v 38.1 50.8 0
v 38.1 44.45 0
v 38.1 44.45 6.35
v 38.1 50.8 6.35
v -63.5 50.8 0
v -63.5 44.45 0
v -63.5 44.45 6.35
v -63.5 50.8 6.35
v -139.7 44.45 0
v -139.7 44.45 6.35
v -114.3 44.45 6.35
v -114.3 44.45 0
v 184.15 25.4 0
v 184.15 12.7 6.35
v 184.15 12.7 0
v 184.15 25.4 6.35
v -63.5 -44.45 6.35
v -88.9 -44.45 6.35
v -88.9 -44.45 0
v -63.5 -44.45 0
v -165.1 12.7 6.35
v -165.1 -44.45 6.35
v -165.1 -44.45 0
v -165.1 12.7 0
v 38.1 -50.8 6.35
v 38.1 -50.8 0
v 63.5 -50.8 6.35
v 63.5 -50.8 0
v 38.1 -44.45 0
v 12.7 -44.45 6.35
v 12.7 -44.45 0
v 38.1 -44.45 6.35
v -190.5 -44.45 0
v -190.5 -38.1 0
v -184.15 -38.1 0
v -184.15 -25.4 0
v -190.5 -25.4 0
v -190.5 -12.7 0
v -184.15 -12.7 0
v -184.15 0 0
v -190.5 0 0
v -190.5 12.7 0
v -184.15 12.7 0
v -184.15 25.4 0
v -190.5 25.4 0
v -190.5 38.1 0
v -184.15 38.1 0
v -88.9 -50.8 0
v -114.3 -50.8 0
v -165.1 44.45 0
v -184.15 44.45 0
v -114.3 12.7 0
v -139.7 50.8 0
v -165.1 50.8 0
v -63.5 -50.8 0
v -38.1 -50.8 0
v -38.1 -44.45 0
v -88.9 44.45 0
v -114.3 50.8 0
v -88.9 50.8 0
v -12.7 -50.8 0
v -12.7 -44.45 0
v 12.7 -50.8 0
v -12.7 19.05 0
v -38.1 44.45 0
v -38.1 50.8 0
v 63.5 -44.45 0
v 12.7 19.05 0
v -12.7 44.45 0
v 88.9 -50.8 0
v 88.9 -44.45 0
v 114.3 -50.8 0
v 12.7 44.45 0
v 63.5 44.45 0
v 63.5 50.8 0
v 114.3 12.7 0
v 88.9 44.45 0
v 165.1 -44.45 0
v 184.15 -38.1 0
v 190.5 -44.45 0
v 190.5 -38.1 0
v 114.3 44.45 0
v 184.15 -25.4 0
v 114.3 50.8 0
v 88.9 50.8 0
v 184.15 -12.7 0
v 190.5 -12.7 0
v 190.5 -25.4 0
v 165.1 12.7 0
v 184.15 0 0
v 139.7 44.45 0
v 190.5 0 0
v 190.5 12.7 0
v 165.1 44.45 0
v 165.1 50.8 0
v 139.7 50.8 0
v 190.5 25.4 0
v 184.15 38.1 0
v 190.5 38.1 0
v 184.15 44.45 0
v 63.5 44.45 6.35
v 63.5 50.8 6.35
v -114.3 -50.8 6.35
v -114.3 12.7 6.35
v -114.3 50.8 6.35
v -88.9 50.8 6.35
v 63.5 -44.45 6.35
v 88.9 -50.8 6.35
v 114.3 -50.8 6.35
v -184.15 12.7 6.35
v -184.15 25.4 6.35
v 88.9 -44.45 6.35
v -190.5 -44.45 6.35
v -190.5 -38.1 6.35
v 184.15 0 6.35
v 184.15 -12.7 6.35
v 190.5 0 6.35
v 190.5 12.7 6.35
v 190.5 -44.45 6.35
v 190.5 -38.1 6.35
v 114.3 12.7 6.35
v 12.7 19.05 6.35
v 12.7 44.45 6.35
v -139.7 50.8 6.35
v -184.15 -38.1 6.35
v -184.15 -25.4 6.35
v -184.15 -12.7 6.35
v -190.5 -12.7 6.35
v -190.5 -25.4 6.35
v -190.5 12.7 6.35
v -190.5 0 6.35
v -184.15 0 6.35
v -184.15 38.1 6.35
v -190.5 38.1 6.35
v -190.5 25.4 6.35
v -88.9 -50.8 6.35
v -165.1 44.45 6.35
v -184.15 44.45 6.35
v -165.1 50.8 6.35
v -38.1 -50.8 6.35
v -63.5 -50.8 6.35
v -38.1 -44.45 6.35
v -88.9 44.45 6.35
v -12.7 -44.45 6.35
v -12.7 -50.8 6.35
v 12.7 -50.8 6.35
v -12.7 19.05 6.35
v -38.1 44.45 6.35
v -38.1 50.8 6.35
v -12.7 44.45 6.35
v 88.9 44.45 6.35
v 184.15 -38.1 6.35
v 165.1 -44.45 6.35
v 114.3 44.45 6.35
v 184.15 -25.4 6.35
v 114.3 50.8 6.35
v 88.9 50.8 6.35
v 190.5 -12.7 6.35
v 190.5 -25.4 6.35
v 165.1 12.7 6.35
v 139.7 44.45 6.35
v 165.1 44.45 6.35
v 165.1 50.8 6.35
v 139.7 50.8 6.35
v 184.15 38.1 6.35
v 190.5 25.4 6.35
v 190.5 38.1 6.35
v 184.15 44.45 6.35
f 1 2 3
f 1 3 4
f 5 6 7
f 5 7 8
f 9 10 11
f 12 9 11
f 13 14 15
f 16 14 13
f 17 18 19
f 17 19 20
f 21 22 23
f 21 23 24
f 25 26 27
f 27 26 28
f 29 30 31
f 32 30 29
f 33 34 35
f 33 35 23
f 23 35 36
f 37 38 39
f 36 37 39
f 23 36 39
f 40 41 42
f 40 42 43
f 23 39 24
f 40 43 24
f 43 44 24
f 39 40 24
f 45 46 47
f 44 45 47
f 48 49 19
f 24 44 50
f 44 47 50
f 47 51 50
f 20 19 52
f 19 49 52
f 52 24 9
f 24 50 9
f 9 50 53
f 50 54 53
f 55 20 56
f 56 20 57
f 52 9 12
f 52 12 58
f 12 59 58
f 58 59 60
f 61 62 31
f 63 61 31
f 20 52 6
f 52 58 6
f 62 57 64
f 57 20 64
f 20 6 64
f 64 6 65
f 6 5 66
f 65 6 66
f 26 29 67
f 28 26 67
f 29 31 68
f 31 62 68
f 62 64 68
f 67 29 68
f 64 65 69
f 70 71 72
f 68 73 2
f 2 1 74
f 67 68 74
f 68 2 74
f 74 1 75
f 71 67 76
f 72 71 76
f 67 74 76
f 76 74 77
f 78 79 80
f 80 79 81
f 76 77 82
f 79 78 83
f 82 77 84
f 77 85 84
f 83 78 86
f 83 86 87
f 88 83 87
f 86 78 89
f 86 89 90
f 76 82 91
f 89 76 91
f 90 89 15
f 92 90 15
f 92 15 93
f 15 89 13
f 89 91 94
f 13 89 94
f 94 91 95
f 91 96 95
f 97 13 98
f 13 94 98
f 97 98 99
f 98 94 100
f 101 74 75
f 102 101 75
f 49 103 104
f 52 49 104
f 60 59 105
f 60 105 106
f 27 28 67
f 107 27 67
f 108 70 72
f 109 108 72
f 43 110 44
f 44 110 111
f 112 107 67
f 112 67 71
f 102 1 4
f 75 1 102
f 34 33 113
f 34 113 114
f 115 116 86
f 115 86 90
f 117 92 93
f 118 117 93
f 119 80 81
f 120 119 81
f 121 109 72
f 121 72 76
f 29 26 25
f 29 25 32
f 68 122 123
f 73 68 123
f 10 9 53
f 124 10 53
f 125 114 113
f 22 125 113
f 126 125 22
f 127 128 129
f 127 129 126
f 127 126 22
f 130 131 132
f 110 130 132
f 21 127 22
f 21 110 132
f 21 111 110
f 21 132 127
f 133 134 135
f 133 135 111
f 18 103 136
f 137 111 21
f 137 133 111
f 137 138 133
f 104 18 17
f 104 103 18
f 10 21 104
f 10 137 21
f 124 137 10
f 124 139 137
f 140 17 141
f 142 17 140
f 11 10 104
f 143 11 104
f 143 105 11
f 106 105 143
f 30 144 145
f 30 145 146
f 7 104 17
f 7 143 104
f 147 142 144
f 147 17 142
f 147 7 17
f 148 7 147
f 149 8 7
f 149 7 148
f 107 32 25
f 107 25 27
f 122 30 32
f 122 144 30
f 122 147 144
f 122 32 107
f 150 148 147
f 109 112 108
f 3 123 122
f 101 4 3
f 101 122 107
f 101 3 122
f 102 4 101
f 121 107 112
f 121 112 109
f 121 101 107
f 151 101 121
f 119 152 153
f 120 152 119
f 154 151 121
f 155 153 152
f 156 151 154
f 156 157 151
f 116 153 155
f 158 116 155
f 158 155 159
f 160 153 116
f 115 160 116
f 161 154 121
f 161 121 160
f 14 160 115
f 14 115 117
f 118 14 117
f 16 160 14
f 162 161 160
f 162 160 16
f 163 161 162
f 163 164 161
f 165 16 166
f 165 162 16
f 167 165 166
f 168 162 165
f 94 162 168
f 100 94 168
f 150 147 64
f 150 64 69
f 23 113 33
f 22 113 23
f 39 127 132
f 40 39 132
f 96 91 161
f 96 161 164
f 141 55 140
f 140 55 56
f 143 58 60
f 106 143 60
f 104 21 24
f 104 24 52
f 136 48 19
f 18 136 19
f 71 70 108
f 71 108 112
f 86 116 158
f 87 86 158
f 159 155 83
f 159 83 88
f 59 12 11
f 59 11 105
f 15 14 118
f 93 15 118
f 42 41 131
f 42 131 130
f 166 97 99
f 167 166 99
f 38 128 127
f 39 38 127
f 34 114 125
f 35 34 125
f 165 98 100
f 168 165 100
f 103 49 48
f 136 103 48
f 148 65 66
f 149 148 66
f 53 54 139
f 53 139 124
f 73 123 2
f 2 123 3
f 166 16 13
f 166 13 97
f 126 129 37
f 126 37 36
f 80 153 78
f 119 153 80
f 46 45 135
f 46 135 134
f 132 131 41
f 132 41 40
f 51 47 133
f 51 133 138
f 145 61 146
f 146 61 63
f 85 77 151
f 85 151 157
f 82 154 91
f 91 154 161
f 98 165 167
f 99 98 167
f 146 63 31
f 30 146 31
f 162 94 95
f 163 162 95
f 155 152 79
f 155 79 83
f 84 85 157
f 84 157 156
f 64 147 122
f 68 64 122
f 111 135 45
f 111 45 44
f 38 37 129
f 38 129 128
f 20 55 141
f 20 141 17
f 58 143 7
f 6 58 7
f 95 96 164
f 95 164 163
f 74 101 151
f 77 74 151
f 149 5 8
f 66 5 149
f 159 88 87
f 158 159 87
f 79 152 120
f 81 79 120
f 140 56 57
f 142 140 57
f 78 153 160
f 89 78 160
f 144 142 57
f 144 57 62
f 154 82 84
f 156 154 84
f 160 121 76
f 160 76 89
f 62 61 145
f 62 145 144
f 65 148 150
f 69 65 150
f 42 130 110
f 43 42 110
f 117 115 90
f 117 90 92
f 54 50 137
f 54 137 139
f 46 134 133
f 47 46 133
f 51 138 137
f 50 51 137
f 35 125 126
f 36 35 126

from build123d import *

# Parameters (mm, degrees)
SKETCH1_W           = 381
SKETCH1_H           = 101.6
BOSS_EXTRUDE1_DEPTH = 6.35
SKETCH2_W           = 19.05
SKETCH2_H           = 6.35
SKETCH2_W_2         = 6.35
SKETCH2_H_2         = 12.7
SKETCH2_W_3         = 25.4
CUT_EXTRUDE1_DEPTH  = 6.35
SKETCH3_W           = 50.8
SKETCH3_H           = 63.5
CUT_EXTRUDE2_DEPTH  = 6.35
SKETCH4_W           = 25.4
SKETCH4_H           = 31.75
CUT_EXTRUDE3_DEPTH  = 6.35


with BuildPart() as part:
    # Sketch1 → Boss-Extrude1 (new body)
    with BuildSketch(Plane.XY):
        Rectangle(SKETCH1_W, SKETCH1_H)
    extrude(amount=BOSS_EXTRUDE1_DEPTH)

    # Sketch2 → Cut-Extrude1 (cut)
    with BuildSketch(Plane.XY.offset(6.35)):
        with Locations((-174.625, 47.625)):
            Rectangle(SKETCH2_W, SKETCH2_H)
        with Locations((-187.325, 47.625)):
            Rectangle(SKETCH2_W_2, SKETCH2_H)
        with Locations((-187.325, 41.275)):
            Rectangle(SKETCH2_W_2, SKETCH2_H)
        with Locations((-187.325, 19.05)):
            Rectangle(SKETCH2_W_2, SKETCH2_H_2)
        with Locations((-187.325, -6.35)):
            Rectangle(SKETCH2_W_2, SKETCH2_H_2)
        with Locations((-187.325, -31.75)):
            Rectangle(SKETCH2_W_2, SKETCH2_H_2)
        with Locations((-177.8, -47.625)):
            Rectangle(SKETCH2_W_3, SKETCH2_H)
        with Locations((-127, -47.625)):
            Rectangle(SKETCH2_W_3, SKETCH2_H)
        with Locations((-76.2, -47.625)):
            Rectangle(SKETCH2_W_3, SKETCH2_H)
        with Locations((-25.4, -47.625)):
            Rectangle(SKETCH2_W_3, SKETCH2_H)
        with Locations((25.4, -47.625)):
            Rectangle(SKETCH2_W_3, SKETCH2_H)
        with Locations((-127, 47.625)):
            Rectangle(SKETCH2_W_3, SKETCH2_H)
        with Locations((-76.2, 47.625)):
            Rectangle(SKETCH2_W_3, SKETCH2_H)
        with Locations((-25.4, 47.625)):
            Rectangle(SKETCH2_W_3, SKETCH2_H)
        with Locations((25.4, 47.625)):
            Rectangle(SKETCH2_W_3, SKETCH2_H)
        with Locations((76.2, 47.625)):
            Rectangle(SKETCH2_W_3, SKETCH2_H)
        with Locations((76.2, -47.625)):
            Rectangle(SKETCH2_W_3, SKETCH2_H)
        with Locations((127, -47.625)):
            Rectangle(SKETCH2_W_3, SKETCH2_H)
        with Locations((127, 47.625)):
            Rectangle(SKETCH2_W_3, SKETCH2_H)
        with Locations((174.625, 47.625)):
            Rectangle(SKETCH2_W, SKETCH2_H)
        with Locations((187.325, 47.625)):
            Rectangle(SKETCH2_W_2, SKETCH2_H)
        with Locations((187.325, 41.275)):
            Rectangle(SKETCH2_W_2, SKETCH2_H)
        with Locations((187.325, 19.05)):
            Rectangle(SKETCH2_W_2, SKETCH2_H_2)
        with Locations((187.325, -6.35)):
            Rectangle(SKETCH2_W_2, SKETCH2_H_2)
        with Locations((187.325, -31.75)):
            Rectangle(SKETCH2_W_2, SKETCH2_H_2)
        with Locations((177.8, -47.625)):
            Rectangle(SKETCH2_W_3, SKETCH2_H)
    extrude(amount=-CUT_EXTRUDE1_DEPTH, mode=Mode.SUBTRACT)

    # Sketch3 → Cut-Extrude2 (cut)
    with BuildSketch(Plane.XY.offset(6.35)):
        with Locations((-139.7, -19.05)):
            Rectangle(SKETCH3_W, SKETCH3_H)
        with Locations((139.7, -19.05)):
            Rectangle(SKETCH3_W, SKETCH3_H)
    extrude(amount=-CUT_EXTRUDE2_DEPTH, mode=Mode.SUBTRACT)

    # Sketch4 → Cut-Extrude3 (cut)
    with BuildSketch(Plane.XY.offset(6.35)):
        with Locations((0, 34.925)):
            Rectangle(SKETCH4_W, SKETCH4_H)
    extrude(amount=-CUT_EXTRUDE3_DEPTH, mode=Mode.SUBTRACT)


solid = part.part
